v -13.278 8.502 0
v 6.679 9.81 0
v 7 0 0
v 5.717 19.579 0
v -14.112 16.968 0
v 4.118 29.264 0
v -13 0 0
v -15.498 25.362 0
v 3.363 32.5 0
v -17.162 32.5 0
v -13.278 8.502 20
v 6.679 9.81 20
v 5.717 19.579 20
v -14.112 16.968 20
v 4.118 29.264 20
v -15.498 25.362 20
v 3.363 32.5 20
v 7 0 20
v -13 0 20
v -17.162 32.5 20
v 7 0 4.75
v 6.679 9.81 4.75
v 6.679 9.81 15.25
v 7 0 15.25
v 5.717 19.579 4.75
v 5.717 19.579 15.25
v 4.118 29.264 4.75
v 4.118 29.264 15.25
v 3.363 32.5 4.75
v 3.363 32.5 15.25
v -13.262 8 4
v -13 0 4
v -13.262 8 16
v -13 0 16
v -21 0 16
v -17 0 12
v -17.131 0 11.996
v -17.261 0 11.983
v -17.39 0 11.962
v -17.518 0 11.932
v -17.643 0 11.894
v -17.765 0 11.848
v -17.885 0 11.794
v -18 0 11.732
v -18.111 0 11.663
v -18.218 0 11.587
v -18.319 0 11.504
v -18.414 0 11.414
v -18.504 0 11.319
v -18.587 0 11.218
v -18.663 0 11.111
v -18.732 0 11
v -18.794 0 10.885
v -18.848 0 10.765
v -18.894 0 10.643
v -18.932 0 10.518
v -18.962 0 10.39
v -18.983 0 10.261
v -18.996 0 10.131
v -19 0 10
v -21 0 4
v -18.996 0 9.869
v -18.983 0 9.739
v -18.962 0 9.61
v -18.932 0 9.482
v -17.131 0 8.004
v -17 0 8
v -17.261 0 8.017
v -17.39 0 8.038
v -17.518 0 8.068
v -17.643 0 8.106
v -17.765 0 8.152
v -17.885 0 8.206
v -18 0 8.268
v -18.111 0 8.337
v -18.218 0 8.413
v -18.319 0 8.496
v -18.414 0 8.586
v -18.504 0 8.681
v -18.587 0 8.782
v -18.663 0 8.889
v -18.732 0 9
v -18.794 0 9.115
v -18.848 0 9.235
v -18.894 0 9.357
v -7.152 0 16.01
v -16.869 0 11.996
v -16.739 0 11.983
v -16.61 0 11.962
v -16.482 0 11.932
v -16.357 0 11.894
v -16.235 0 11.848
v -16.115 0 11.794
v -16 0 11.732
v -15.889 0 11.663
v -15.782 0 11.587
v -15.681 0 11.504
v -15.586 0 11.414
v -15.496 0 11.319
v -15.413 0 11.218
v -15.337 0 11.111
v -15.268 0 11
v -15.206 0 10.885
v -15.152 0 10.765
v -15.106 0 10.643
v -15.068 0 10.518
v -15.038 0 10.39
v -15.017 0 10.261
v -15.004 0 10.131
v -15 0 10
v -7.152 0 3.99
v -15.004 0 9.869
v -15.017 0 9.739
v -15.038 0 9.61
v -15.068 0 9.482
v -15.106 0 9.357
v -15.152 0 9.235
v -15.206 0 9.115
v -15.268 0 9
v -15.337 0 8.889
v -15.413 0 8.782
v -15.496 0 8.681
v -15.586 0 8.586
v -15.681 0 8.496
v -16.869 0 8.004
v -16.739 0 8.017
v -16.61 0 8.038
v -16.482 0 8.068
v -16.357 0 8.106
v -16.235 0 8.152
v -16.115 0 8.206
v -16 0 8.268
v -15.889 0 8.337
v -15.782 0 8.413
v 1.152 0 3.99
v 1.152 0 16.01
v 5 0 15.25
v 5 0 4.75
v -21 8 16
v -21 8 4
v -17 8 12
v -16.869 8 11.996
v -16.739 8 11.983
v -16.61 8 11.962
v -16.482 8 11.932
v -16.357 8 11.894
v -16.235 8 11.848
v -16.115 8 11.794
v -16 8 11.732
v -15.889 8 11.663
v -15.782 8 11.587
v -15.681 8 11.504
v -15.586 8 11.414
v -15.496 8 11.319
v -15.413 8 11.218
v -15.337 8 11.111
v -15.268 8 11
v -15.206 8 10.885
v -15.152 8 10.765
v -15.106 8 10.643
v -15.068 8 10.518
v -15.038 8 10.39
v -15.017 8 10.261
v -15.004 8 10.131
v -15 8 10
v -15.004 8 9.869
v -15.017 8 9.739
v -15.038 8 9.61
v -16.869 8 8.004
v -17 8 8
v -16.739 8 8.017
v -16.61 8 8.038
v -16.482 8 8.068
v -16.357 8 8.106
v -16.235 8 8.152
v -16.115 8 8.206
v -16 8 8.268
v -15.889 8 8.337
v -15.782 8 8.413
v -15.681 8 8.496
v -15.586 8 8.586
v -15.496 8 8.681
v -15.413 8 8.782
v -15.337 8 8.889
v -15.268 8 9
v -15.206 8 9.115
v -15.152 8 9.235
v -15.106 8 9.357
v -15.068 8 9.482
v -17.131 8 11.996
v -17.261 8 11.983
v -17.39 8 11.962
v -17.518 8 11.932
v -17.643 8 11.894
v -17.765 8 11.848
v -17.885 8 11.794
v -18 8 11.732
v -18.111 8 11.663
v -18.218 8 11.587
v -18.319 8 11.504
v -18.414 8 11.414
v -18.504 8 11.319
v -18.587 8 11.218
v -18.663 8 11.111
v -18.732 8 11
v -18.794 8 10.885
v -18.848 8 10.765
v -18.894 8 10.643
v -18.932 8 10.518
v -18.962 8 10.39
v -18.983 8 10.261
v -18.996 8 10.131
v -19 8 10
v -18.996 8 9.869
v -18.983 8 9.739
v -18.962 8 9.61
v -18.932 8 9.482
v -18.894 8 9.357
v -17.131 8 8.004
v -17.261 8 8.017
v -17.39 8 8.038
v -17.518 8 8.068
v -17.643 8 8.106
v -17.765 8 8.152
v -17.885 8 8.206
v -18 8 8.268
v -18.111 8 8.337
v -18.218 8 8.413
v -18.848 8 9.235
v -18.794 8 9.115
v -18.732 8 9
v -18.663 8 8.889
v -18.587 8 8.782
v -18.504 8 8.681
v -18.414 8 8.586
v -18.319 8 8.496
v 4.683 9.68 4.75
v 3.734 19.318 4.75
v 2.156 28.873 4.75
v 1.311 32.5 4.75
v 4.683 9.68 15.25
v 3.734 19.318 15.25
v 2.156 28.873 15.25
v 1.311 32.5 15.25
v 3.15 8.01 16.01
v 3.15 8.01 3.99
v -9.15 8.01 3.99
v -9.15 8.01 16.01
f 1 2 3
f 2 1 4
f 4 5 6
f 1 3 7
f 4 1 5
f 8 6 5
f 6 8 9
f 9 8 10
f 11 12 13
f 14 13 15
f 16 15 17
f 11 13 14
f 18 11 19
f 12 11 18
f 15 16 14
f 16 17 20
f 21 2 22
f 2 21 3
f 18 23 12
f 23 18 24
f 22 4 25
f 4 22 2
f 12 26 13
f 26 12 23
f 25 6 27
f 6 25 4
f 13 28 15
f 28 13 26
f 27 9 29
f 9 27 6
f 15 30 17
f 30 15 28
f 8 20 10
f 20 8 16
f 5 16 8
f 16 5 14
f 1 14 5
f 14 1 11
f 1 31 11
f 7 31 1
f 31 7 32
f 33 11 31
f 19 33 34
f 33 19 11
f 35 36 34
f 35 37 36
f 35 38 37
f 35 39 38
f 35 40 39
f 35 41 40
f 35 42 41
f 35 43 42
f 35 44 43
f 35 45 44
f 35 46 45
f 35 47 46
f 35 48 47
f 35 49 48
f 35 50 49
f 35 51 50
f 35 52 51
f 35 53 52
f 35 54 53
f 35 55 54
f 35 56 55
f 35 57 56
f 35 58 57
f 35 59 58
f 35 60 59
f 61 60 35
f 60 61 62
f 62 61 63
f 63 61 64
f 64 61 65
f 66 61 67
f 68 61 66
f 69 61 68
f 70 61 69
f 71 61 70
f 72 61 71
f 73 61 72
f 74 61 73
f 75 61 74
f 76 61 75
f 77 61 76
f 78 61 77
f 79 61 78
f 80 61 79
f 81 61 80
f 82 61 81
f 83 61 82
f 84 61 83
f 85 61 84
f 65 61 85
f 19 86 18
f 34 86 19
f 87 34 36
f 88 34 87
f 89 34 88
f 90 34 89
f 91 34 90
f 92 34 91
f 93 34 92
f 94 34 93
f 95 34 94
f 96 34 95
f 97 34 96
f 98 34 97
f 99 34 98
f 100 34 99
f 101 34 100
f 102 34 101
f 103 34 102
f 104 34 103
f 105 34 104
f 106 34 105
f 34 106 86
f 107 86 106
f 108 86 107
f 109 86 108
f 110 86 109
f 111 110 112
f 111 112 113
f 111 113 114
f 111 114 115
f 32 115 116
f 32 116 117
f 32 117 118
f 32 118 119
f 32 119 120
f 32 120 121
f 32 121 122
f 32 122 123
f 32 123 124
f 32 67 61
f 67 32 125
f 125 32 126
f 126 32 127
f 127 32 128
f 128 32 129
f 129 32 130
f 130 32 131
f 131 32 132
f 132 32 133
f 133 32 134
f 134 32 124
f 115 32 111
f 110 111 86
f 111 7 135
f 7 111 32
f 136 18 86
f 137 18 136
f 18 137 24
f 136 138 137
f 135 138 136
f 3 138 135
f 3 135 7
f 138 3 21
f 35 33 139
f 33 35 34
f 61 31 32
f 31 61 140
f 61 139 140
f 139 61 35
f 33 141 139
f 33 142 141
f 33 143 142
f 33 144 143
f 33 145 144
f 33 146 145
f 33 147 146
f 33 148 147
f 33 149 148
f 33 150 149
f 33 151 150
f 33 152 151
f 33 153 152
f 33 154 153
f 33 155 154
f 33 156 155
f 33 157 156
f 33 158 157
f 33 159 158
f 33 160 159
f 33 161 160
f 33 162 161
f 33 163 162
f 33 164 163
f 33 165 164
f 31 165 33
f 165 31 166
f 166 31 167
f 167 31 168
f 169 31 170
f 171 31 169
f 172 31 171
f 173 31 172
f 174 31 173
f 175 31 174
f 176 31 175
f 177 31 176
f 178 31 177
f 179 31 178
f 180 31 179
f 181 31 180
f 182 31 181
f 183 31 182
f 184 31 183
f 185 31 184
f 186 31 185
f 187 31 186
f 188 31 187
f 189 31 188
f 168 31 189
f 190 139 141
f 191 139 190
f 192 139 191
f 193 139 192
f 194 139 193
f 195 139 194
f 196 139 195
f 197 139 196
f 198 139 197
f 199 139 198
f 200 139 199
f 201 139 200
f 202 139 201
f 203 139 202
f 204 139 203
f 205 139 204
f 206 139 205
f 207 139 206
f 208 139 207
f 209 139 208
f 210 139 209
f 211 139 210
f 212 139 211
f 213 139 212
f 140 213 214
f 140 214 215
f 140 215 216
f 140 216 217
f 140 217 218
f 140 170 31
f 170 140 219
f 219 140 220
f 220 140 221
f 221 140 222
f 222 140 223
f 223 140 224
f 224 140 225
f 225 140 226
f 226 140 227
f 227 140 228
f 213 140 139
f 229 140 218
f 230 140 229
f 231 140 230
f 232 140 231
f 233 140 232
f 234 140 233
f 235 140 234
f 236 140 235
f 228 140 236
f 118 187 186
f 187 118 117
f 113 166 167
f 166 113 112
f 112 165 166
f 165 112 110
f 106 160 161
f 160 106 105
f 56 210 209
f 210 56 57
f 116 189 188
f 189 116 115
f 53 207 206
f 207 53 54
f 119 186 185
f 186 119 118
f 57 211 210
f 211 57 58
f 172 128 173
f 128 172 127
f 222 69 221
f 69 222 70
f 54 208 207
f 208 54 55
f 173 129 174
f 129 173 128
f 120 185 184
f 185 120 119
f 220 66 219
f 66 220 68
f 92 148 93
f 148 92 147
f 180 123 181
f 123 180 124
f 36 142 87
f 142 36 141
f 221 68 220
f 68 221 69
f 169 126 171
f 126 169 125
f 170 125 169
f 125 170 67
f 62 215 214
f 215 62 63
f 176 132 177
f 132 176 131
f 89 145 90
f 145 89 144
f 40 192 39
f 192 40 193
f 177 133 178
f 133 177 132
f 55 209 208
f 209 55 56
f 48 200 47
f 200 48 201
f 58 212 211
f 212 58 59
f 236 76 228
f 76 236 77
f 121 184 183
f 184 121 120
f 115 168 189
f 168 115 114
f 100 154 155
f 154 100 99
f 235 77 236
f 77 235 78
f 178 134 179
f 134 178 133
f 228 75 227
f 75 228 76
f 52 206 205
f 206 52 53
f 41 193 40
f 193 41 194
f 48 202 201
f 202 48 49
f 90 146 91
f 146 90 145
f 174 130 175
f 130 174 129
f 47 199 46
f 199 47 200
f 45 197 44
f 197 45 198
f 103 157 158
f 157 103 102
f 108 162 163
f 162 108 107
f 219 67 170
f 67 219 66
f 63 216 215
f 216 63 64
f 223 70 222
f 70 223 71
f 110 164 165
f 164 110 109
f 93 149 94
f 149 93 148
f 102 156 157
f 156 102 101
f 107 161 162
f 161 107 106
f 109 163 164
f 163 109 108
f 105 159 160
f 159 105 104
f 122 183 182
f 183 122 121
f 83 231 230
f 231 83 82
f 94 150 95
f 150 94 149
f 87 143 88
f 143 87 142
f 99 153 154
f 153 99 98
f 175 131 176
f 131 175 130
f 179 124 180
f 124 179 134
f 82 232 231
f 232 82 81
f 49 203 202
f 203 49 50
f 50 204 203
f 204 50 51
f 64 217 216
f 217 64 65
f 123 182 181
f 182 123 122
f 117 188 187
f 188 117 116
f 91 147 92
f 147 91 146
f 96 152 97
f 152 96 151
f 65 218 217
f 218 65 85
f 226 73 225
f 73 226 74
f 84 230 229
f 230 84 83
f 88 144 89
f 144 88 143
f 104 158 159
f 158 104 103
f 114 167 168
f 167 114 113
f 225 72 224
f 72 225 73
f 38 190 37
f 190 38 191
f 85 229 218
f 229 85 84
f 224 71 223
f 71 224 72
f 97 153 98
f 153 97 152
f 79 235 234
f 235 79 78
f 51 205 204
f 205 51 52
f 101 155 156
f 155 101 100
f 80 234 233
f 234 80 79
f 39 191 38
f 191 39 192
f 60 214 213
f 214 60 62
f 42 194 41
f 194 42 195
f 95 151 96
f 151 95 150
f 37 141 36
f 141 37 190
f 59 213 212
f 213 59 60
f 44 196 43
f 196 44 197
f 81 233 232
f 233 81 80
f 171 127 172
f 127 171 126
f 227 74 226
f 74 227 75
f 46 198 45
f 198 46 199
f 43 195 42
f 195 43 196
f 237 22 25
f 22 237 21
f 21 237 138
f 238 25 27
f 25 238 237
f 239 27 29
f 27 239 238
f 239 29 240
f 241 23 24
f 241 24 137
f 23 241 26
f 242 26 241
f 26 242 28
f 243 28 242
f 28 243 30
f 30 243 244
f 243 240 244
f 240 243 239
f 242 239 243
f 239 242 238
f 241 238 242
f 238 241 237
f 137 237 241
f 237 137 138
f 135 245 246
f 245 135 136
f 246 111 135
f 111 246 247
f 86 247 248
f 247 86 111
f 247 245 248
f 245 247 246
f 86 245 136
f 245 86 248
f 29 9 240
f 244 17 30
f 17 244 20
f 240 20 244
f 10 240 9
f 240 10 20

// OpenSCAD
// file: rim_segment.scad
// ferris/rim_segment.scad
// Quarter (90 deg) rim arc with integrated spokes, outer LED groove,
// end dovetails and tangential M3 insert bosses.
// 8 of these make the two discs (4 per disc). All segments are identical;
// segment B = segment A rotated +90 deg, so the tenon on the 90 deg end mates
// with the mortise on the next segment's 0 deg end.

include <../params.scad>;
use <../lib/dovetail.scad>;

dt_h = 12;              // dovetail height (z), centred in the 20 mm band
dt_z = (rim_depth - dt_h) / 2;   // = 4
boss_side = 8;         // tangential + radial size of the joint boss
boss_z = 12;
boss_r_out = rim_inner_r;        // boss hangs inward from the inner rim face
boss_r_in  = rim_inner_r - boss_side;
boss_hole_r = (boss_r_out + boss_r_in) / 2;   // radius at which the bolt runs

module spoke() {
    // radial beam from the mount pad out to the inner rim, plus a bolt pad
    beam_r0 = spoke_mount_r - 2;
    beam_r1 = rim_inner_r + 2;   // overlap into rim for a clean union
    difference() {
        union() {
            translate([(beam_r0 + beam_r1)/2, 0, rim_depth/2])
                cube([beam_r1 - beam_r0, spoke_width, spoke_depth], center = true);
            translate([spoke_mount_r, 0, rim_depth/2])
                cylinder(d = spoke_pad_d, h = spoke_depth, center = true);
        }
        // M3 clearance to bolt onto the hub face
        translate([spoke_mount_r, 0, -1])
            cylinder(d = m3_clear, h = rim_depth + 2);
    }
}

module joint_boss(hole_d) {
    // block hanging inward from the inner rim, with a tangential bolt hole.
    // Modelled at the 0 deg end (face on the x-z plane, y=0), protruding +y.
    difference() {
        translate([boss_r_in, 0, (rim_depth - boss_z)/2])
            cube([boss_side, boss_side, boss_z]);
        // tangential hole along +y at radius boss_hole_r, mid height
        translate([boss_hole_r, -0.1, rim_depth/2])
            rotate([-90, 0, 0])
                cylinder(d = hole_d, h = boss_side + 0.2);
    }
}

module rim_segment() {
    difference() {
        union() {
            // --- annular band, first-quadrant 90 deg wedge ---
            intersection() {
                linear_extrude(rim_depth)
                    difference() { circle(rim_outer_r); circle(rim_inner_r); }
                translate([0, 0, -1])
                    cube([rim_outer_r + 5, rim_outer_r + 5, rim_depth + 2]);
            }
            // --- spokes at 22.5 and 67.5 deg ---
            rotate([0, 0, 22.5]) spoke();
            rotate([0, 0, 67.5]) spoke();
            // --- dovetail tenon on the 90 deg end (protrudes -x, tip wider) ---
            translate([0, rim_outer_r - rim_radial_w/2, dt_z])
                rotate([0, 0, 90])
                    dovetail_tenon(h = dt_h);
            // --- insert boss on 0 deg end, clearance-lug on 90 deg end ---
            joint_boss(m3_insert);                       // 0 deg end (insert)
            mirror([1, -1, 0]) joint_boss(m3_clear);     // 90 deg end (clearance)
        }
        // --- LED groove on the outer periphery ---
        translate([0, 0, (rim_depth - led_groove_w)/2])
            linear_extrude(led_groove_w)
                difference() {
                    circle(rim_outer_r + 5);
                    circle(rim_outer_r - led_groove_d);
                }
        // --- dovetail mortise on the 0 deg end (opens +y) ---
        translate([rim_outer_r - rim_radial_w/2, 0, dt_z])
            dovetail_mortise(h = dt_h);
        // --- gondola axle through-hole (Ø3 rod, E-ring retained outside) ---
        rotate([0, 0, gon_axle_seg_angle])
            translate([gon_axle_r, 0, -1])
                cylinder(d = gon_axle_hole_d, h = rim_depth + 2);
    }
}

rim_segment();
// file: ../lib/dovetail.scad
// lib/dovetail.scad
// Shared joinery modules: dovetail tenon/mortise, M3 insert boss, rounded box.
// Depends on values in params.scad (include it in the calling file).

// A dovetail tenon: a flared prism that grows wider toward its tip so it locks
// against a matching mortise when slid in along +y.
//   len   : protrusion length (along +y)
//   base_w: width at the root (x, near the part)
//   tip_w : width at the tip (x, wider -> self locking)
//   h     : height (z)
// Literal defaults keep this library self-contained under `use <>` (which does
// not import the caller's params). Callers pass explicit sizes where needed.
module dovetail_tenon(len = 8, base_w = 8, tip_w = 12, h = 10) {
    linear_extrude(height = h)
        polygon(points = [
            [-base_w/2, 0],
            [ base_w/2, 0],
            [ tip_w/2,  len],
            [-tip_w/2,  len],
        ]);
}

// Matching mortise volume (subtract this). Enlarged by tol_dovetail per side.
module dovetail_mortise(len = 8, base_w = 8, tip_w = 12, h = 10, clr = 0.15) {
    // extend slightly beyond both faces so the cut is clean
    translate([0, -0.01, -0.01])
        linear_extrude(height = h + 0.02)
            polygon(points = [
                [-(base_w/2 + clr), 0],
                [ (base_w/2 + clr), 0],
                [ (tip_w/2 + clr),  len + 0.02],
                [-(tip_w/2 + clr),  len + 0.02],
            ]);
}

// Cylindrical boss with a blind hole for a heat-set insert.
//   boss_d : outer diameter of the boss
//   boss_h : height
//   hole_d : insert press-hole diameter (params: m3_insert)
//   hole_depth : blind hole depth (0 = through)
module insert_boss(boss_d = 8, boss_h = 8, hole_d = 4.0, hole_depth = 0) {
    difference() {
        cylinder(d = boss_d, h = boss_h);
        translate([0, 0, hole_depth == 0 ? -0.01 : boss_h - hole_depth])
            cylinder(d = hole_d, h = hole_depth == 0 ? boss_h + 0.02 : hole_depth + 0.01);
    }
}

// Rounded rectangular box shell (open top) used by gondola / recesses.
module rounded_box(x, y, z, r = 2) {
    hull() {
        for (sx = [-1, 1], sy = [-1, 1])
            translate([sx * (x/2 - r), sy * (y/2 - r), 0])
                cylinder(r = r, h = z);
    }
}

// A simple rectangular slot cutter (for tabs), centered on x, open along z.
module slot(w, t, d) {
    translate([-w/2, -t/2, -0.01])
        cube([w, t, d + 0.02]);
}
// main file
// joint_test_a.scad
// Coupon A: the 0 deg end of the rim segment (dovetail mortise + M3 insert boss).
// Centered near the origin, flat on the bed. Mates with joint_test_b.

include <../params.scad>
use <../lib/dovetail.scad>
use <rim_segment.scad>

coupon = 45;   // cube side of the cut region around the joint end

// bring the 0 deg end (located near x=rim_outer_r-..150, y=0) back to origin
translate([-(rim_inner_r - 12) - (rim_radial_w + 30)/2, 0, 0])
    intersection() {
        rim_segment();
        translate([rim_inner_r - 12, -coupon/2 + 10, -1])
            cube([rim_radial_w + 30, coupon, rim_depth + 2]);
    }
